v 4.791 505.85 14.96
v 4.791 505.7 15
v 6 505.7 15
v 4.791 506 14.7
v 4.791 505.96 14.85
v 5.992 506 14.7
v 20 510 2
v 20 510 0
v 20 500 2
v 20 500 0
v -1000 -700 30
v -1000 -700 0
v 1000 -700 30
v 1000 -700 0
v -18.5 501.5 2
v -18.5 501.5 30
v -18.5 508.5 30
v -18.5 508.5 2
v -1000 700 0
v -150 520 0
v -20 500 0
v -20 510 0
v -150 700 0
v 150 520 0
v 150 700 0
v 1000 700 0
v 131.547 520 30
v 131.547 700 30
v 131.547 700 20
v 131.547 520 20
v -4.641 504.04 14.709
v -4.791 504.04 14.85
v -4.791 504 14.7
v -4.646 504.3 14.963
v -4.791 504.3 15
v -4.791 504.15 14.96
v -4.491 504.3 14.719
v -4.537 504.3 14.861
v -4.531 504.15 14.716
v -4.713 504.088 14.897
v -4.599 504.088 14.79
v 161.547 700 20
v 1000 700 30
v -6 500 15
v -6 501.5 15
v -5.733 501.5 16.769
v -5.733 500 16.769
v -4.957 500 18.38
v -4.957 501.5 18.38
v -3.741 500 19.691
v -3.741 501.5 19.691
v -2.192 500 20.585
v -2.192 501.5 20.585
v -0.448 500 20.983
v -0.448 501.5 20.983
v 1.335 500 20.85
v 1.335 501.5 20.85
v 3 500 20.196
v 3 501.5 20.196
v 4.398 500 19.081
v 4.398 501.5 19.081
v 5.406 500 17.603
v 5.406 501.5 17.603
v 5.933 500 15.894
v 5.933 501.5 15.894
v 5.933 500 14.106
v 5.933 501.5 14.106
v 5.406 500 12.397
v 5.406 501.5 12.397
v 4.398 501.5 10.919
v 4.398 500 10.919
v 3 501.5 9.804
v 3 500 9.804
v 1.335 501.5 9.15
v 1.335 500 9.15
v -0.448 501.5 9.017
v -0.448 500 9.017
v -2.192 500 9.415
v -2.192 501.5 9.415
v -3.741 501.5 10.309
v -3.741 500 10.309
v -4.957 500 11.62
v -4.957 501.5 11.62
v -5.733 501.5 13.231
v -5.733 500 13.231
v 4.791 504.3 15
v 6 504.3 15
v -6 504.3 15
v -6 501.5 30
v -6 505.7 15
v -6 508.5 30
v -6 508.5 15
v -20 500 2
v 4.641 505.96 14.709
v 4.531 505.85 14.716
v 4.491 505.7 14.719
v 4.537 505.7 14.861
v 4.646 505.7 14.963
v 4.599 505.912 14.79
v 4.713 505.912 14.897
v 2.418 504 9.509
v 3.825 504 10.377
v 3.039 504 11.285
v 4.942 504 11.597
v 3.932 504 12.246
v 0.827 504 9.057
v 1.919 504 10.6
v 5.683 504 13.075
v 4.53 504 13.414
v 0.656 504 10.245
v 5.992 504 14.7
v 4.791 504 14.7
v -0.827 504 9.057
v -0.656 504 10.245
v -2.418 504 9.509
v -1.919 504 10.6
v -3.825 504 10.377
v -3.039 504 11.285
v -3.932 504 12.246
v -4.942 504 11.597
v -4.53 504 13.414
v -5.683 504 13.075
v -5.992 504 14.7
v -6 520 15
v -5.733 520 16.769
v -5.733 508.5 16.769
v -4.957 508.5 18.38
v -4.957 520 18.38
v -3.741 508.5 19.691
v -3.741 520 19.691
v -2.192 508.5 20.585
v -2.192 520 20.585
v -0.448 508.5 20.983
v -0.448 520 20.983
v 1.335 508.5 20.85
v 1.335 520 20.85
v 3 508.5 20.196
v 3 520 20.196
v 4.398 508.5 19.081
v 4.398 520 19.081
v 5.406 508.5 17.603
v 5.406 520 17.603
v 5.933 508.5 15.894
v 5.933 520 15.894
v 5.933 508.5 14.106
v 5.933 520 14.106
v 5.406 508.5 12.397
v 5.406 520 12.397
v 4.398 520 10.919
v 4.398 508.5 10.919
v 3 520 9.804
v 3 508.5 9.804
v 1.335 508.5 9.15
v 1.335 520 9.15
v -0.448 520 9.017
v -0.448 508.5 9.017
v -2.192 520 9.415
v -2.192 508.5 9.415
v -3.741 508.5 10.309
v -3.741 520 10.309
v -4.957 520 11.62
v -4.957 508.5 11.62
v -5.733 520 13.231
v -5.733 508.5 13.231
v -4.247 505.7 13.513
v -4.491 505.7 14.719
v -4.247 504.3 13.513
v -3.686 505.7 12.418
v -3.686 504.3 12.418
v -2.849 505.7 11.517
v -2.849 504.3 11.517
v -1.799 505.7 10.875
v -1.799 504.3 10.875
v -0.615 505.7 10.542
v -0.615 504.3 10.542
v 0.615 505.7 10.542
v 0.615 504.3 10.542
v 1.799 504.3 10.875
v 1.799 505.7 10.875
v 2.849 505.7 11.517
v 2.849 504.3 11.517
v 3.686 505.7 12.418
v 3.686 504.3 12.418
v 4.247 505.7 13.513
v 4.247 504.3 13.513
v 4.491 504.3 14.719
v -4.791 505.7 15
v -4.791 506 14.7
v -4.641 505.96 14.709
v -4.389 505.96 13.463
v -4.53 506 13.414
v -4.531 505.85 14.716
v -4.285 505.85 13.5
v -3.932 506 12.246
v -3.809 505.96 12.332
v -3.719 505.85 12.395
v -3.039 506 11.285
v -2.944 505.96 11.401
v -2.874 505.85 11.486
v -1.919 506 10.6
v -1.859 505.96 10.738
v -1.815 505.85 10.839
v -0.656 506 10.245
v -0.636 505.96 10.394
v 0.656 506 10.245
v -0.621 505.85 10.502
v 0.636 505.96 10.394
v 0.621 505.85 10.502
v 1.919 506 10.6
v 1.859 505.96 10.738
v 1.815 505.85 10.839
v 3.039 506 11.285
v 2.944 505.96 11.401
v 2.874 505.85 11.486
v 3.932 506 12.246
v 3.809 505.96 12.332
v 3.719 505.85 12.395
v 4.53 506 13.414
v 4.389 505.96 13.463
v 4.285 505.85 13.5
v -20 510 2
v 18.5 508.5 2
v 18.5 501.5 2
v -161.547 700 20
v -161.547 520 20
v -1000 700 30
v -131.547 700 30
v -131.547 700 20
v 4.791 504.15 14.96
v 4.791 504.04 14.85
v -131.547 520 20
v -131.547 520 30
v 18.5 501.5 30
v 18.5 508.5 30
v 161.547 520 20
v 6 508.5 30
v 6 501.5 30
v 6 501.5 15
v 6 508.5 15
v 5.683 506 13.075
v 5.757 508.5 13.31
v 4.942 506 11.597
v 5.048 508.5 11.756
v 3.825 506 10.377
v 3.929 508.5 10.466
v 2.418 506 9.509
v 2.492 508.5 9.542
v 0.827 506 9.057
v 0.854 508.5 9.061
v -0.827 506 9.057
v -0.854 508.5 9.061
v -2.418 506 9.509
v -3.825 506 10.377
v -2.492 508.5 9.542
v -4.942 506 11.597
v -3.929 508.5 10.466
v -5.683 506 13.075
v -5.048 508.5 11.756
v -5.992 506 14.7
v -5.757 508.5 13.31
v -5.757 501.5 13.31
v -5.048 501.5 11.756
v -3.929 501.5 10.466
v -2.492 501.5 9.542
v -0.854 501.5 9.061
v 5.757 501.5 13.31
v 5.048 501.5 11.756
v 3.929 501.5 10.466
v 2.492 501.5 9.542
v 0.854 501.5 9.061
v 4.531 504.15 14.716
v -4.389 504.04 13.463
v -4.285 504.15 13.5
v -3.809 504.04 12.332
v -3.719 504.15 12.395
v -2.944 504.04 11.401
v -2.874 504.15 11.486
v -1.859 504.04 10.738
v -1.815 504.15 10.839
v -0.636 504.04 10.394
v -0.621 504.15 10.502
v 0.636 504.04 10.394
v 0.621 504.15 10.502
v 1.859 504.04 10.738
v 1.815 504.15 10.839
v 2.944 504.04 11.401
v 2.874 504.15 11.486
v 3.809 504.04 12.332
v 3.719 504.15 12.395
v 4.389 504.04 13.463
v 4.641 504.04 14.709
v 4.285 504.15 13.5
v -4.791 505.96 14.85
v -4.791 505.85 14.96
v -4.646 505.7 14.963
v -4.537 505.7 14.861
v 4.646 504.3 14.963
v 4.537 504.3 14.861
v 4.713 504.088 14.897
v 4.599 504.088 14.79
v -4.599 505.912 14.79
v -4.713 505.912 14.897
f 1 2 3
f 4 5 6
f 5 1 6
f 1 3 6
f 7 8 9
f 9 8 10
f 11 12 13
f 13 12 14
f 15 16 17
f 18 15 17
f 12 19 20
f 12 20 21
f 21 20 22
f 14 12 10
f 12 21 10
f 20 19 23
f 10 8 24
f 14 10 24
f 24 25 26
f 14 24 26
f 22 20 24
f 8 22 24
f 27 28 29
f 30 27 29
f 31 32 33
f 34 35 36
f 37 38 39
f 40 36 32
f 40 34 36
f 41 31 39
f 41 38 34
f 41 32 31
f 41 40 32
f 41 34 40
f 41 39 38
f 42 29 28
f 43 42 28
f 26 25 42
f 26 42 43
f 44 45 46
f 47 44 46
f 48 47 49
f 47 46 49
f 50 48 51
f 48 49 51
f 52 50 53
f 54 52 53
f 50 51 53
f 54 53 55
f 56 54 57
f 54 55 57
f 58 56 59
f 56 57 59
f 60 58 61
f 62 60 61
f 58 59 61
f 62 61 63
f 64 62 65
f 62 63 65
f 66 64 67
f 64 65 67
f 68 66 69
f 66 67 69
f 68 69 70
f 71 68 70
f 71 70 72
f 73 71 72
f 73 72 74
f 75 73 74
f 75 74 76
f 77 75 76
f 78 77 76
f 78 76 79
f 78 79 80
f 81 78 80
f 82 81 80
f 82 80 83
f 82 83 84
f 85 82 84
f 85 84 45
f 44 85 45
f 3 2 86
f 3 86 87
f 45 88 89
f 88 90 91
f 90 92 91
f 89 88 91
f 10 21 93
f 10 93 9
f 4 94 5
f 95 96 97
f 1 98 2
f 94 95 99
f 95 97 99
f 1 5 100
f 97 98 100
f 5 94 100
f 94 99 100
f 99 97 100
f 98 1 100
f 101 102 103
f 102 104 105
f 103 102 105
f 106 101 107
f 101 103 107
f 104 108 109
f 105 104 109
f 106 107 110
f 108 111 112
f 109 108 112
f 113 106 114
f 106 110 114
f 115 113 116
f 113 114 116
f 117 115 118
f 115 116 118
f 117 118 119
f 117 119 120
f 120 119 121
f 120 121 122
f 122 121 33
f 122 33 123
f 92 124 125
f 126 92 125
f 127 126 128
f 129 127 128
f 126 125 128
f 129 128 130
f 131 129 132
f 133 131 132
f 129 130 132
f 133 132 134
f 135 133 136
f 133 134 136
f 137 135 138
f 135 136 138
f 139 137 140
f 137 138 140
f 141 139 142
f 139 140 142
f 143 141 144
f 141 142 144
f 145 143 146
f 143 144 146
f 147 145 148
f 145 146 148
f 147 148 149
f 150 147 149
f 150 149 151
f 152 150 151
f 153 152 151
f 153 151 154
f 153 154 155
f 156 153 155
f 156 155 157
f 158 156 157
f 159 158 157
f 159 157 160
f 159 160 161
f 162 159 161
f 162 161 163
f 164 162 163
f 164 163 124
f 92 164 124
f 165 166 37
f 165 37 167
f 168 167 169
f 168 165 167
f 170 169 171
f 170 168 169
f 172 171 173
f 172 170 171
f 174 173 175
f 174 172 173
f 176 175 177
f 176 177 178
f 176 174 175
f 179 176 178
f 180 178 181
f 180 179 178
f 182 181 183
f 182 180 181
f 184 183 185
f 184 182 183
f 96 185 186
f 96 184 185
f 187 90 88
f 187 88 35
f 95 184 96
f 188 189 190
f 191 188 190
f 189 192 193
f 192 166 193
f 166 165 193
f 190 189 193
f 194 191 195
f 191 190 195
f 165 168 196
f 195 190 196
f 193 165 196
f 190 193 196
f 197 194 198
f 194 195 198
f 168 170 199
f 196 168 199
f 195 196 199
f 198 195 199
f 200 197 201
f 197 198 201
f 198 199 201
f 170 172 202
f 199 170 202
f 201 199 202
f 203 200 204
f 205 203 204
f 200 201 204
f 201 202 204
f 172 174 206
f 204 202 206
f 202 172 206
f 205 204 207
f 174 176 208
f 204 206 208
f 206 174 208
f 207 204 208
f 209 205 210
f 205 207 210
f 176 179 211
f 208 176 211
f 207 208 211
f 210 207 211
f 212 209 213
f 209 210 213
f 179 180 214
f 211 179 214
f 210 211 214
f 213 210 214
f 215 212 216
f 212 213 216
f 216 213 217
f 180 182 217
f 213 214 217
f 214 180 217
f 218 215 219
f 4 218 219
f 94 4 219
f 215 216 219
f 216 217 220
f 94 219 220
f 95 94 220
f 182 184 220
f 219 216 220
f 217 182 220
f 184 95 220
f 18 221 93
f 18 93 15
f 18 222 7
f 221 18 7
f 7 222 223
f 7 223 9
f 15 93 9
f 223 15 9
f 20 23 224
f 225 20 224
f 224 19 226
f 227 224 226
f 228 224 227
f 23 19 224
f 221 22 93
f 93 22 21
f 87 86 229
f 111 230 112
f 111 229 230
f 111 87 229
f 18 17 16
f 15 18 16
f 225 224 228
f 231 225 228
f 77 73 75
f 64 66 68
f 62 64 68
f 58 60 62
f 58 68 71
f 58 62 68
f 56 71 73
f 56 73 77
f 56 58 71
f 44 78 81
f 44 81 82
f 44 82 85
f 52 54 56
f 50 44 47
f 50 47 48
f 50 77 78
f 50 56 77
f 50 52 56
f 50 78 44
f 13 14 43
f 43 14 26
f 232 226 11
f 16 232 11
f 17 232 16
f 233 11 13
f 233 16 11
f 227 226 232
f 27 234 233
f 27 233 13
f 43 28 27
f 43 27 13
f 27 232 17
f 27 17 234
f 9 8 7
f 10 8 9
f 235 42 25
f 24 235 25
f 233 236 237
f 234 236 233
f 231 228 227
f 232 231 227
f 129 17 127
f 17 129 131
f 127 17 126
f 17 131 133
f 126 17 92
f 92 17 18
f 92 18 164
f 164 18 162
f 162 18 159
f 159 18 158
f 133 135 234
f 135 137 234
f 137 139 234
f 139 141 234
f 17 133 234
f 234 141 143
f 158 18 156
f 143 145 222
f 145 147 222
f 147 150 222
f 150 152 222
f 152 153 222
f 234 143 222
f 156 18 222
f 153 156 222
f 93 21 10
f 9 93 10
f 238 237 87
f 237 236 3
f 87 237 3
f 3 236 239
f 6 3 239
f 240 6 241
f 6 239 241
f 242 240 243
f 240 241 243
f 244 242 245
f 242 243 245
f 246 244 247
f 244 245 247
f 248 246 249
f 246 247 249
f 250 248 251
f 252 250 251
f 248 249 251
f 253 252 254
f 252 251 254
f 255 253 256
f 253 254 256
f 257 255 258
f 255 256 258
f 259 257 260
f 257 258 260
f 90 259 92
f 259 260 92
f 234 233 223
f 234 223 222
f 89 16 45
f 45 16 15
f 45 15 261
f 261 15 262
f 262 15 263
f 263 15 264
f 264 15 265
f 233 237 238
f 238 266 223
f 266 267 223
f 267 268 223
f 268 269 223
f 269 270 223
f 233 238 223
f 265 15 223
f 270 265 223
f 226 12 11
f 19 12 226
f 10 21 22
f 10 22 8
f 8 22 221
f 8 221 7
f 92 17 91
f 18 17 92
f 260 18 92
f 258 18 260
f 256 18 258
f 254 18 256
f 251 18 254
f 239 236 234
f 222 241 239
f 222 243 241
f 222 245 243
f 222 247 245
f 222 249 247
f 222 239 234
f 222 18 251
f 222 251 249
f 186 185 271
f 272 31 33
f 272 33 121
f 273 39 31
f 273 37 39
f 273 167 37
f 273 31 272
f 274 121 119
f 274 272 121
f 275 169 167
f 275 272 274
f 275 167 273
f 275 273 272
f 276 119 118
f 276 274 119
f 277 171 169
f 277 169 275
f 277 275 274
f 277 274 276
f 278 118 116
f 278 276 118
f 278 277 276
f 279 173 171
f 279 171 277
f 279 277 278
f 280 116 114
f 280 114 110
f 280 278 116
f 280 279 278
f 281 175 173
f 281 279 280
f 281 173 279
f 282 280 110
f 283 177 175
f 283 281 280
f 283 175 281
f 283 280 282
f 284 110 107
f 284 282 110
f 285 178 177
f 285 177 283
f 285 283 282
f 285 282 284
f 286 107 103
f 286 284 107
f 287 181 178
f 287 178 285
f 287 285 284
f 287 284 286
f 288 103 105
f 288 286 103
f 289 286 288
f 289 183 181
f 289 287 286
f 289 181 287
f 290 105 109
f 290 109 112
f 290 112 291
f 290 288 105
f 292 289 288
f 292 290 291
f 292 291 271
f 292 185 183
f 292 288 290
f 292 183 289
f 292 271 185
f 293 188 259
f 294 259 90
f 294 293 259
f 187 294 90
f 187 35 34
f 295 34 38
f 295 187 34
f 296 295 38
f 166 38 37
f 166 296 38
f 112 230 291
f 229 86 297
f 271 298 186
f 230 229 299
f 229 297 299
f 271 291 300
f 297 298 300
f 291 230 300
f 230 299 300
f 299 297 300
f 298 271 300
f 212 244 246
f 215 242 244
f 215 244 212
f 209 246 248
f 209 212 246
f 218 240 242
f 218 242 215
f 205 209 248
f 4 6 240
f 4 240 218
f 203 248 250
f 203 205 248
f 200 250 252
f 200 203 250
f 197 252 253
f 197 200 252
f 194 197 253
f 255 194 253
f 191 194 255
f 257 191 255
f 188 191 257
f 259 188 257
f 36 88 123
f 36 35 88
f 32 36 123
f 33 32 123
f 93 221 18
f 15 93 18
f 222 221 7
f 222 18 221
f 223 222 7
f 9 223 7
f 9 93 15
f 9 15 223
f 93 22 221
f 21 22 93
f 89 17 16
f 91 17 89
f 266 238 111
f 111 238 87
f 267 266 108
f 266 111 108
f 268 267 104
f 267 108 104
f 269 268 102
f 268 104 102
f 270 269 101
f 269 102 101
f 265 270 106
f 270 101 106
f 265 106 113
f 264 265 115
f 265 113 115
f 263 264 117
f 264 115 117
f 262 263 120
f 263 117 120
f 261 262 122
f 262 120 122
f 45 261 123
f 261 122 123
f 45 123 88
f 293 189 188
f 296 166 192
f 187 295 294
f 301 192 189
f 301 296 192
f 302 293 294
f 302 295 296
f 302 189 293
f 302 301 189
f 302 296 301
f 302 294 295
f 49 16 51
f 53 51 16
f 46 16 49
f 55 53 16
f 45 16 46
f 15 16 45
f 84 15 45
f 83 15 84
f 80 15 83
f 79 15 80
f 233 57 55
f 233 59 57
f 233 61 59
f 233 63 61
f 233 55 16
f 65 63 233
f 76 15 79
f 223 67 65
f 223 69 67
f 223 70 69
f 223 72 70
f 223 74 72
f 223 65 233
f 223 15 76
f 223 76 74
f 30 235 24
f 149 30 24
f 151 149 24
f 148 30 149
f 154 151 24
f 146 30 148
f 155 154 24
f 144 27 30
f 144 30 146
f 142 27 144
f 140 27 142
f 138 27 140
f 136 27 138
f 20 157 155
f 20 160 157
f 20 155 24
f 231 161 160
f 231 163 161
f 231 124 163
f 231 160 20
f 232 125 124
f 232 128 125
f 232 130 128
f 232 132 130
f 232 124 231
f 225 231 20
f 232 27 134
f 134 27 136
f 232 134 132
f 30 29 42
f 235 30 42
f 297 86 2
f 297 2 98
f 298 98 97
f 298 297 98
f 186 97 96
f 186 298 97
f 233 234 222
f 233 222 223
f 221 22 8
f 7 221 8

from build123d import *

# Parameters (mm, degrees)
F0_W      = 2000
F0_H      = 1400
F1_DEPTH  = 30
F3_DEPTH  = 180
F4_R      = 6
F5_DEPTH  = 20
F6_W      = 40
F6_H      = 10
F7_DEPTH  = 2
F9_W      = 37
F9_H      = 7
F10_DEPTH = 28.001
F12_DEPTH = 2
F13_W     = 37
F13_H     = 7
F14_DEPTH = 28
F15_DEPTH = 12.5
F16_DEPTH = 1
F17_R     = 0.3


with BuildPart() as f1:
    # F0 (on Top) → F1 (new body)
    with BuildSketch(Plane.XY):
        Rectangle(F0_W, F0_H)
    extrude(amount=F1_DEPTH)

    # F2 (on face) → F3 (cut)
    with BuildSketch(Plane(origin=(0, 700, 0), x_dir=(-1, 0, 0), z_dir=(0, 1, 0))):
        Polygon((-161.5470053838, 20), (-150, 0), (150, 0), (161.5470053838, 20), (131.5470053838, 20), (131.5470053838, 30), (-131.5470053838, 30), (-131.5470053838, 20), align=None)
    extrude(amount=-F3_DEPTH, mode=Mode.SUBTRACT)

    # F4 (on face) → F5 (cut)
    with BuildSketch(Plane(origin=(0, 520, 0), x_dir=(-1, 0, 0), z_dir=(0, 1, 0))):
        with Locations((0, 15)):
            Circle(F4_R)
    extrude(amount=-F5_DEPTH, mode=Mode.SUBTRACT)

    # F6 (on face) → F7 (cut)
    with BuildSketch(Plane(origin=(0, 0, 0), x_dir=(1, 0, 0), z_dir=(0, 0, -1))):
        with Locations((0, -505)):
            Rectangle(F6_W, F6_H)
    extrude(amount=-F7_DEPTH, mode=Mode.SUBTRACT)

    # F9 (on face) → F10 (cut, through all)
    with BuildSketch(Plane(origin=(0, 0, 2), x_dir=(1, 0, 0), z_dir=(0, 0, -1))):
        with Locations((0, -505)):
            Rectangle(F9_W, F9_H)
    extrude(amount=-F10_DEPTH, mode=Mode.SUBTRACT)


with BuildPart() as f12:
    # F6 (on face) → F12 (new body, through all)
    with BuildSketch(Plane(origin=(0, 0, 0), x_dir=(1, 0, 0), z_dir=(0, 0, -1))):
        with Locations((0, -505)):
            Rectangle(F6_W, F6_H)
    extrude(amount=-F12_DEPTH)

    # F13 (on face) → F14 (join, through all)
    with BuildSketch(Plane.XY.offset(2)):
        with Locations((0, 505)):
            Rectangle(F13_W, F13_H)
    extrude(amount=F14_DEPTH)

    # F11 (on offset) → F15 (cut, symmetric)
    with BuildSketch(Plane(origin=(0, 505, 0), x_dir=(-1, 0, 0), z_dir=(0, 1, 0))):
        with BuildLine():
            ThreePointArc((-6, 15), (0, 21), (6, 15))
            Line((6, 15), (6, 30))
            Line((6, 30), (-6, 30))
            Line((-6, 30), (-6, 15))
        make_face()
        with BuildLine():
            Line((4.5, 15), (6, 15))
            ThreePointArc((6, 15), (0, 21), (-6, 15))
            Line((-6, 15), (-4.5, 15))
            ThreePointArc((-4.5, 15), (0, 19.5), (4.5, 15))
        make_face()
        with BuildLine():
            Line((-4.5, 15), (4.5, 15))
            ThreePointArc((4.5, 15), (0, 19.5), (-4.5, 15))
        make_face()
        with BuildLine():
            ThreePointArc((-4.5, 15), (0, 10.5), (4.5, 15))
            Line((4.5, 15), (-4.5, 15))
        make_face()
        with BuildLine():
            ThreePointArc((-6, 15), (0, 9), (6, 15))
            Line((6, 15), (4.5, 15))
            ThreePointArc((4.5, 15), (0, 10.5), (-4.5, 15))
            Line((-4.5, 15), (-6, 15))
        make_face()
    extrude(amount=F15_DEPTH, both=True, mode=Mode.SUBTRACT)

    # F11 (on offset) → F16 (join, symmetric)
    with BuildSketch(Plane(origin=(0, 505, 0), x_dir=(-1, 0, 0), z_dir=(0, 1, 0))):
        with BuildLine():
            ThreePointArc((-6, 15), (0, 9), (6, 15))
            Line((6, 15), (4.5, 15))
            ThreePointArc((4.5, 15), (0, 10.5), (-4.5, 15))
            Line((-4.5, 15), (-6, 15))
        make_face()
    extrude(amount=F16_DEPTH, both=True)

    # F17
    f17_edges = [f12.edges().sort_by_distance(p)[0] for p in [
        (4.5, 505, 15),
        (5.25, 504, 15),
        (0, 506, 10.5),
        (0, 504, 10.5),
        (5.25, 506, 15),
        (-5.25, 506, 15),
        (-4.5, 505, 15),
        (-5.25, 504, 15),
    ]]
    fillet(f17_edges, radius=F17_R)


solid = Compound([f1.part, f12.part])
